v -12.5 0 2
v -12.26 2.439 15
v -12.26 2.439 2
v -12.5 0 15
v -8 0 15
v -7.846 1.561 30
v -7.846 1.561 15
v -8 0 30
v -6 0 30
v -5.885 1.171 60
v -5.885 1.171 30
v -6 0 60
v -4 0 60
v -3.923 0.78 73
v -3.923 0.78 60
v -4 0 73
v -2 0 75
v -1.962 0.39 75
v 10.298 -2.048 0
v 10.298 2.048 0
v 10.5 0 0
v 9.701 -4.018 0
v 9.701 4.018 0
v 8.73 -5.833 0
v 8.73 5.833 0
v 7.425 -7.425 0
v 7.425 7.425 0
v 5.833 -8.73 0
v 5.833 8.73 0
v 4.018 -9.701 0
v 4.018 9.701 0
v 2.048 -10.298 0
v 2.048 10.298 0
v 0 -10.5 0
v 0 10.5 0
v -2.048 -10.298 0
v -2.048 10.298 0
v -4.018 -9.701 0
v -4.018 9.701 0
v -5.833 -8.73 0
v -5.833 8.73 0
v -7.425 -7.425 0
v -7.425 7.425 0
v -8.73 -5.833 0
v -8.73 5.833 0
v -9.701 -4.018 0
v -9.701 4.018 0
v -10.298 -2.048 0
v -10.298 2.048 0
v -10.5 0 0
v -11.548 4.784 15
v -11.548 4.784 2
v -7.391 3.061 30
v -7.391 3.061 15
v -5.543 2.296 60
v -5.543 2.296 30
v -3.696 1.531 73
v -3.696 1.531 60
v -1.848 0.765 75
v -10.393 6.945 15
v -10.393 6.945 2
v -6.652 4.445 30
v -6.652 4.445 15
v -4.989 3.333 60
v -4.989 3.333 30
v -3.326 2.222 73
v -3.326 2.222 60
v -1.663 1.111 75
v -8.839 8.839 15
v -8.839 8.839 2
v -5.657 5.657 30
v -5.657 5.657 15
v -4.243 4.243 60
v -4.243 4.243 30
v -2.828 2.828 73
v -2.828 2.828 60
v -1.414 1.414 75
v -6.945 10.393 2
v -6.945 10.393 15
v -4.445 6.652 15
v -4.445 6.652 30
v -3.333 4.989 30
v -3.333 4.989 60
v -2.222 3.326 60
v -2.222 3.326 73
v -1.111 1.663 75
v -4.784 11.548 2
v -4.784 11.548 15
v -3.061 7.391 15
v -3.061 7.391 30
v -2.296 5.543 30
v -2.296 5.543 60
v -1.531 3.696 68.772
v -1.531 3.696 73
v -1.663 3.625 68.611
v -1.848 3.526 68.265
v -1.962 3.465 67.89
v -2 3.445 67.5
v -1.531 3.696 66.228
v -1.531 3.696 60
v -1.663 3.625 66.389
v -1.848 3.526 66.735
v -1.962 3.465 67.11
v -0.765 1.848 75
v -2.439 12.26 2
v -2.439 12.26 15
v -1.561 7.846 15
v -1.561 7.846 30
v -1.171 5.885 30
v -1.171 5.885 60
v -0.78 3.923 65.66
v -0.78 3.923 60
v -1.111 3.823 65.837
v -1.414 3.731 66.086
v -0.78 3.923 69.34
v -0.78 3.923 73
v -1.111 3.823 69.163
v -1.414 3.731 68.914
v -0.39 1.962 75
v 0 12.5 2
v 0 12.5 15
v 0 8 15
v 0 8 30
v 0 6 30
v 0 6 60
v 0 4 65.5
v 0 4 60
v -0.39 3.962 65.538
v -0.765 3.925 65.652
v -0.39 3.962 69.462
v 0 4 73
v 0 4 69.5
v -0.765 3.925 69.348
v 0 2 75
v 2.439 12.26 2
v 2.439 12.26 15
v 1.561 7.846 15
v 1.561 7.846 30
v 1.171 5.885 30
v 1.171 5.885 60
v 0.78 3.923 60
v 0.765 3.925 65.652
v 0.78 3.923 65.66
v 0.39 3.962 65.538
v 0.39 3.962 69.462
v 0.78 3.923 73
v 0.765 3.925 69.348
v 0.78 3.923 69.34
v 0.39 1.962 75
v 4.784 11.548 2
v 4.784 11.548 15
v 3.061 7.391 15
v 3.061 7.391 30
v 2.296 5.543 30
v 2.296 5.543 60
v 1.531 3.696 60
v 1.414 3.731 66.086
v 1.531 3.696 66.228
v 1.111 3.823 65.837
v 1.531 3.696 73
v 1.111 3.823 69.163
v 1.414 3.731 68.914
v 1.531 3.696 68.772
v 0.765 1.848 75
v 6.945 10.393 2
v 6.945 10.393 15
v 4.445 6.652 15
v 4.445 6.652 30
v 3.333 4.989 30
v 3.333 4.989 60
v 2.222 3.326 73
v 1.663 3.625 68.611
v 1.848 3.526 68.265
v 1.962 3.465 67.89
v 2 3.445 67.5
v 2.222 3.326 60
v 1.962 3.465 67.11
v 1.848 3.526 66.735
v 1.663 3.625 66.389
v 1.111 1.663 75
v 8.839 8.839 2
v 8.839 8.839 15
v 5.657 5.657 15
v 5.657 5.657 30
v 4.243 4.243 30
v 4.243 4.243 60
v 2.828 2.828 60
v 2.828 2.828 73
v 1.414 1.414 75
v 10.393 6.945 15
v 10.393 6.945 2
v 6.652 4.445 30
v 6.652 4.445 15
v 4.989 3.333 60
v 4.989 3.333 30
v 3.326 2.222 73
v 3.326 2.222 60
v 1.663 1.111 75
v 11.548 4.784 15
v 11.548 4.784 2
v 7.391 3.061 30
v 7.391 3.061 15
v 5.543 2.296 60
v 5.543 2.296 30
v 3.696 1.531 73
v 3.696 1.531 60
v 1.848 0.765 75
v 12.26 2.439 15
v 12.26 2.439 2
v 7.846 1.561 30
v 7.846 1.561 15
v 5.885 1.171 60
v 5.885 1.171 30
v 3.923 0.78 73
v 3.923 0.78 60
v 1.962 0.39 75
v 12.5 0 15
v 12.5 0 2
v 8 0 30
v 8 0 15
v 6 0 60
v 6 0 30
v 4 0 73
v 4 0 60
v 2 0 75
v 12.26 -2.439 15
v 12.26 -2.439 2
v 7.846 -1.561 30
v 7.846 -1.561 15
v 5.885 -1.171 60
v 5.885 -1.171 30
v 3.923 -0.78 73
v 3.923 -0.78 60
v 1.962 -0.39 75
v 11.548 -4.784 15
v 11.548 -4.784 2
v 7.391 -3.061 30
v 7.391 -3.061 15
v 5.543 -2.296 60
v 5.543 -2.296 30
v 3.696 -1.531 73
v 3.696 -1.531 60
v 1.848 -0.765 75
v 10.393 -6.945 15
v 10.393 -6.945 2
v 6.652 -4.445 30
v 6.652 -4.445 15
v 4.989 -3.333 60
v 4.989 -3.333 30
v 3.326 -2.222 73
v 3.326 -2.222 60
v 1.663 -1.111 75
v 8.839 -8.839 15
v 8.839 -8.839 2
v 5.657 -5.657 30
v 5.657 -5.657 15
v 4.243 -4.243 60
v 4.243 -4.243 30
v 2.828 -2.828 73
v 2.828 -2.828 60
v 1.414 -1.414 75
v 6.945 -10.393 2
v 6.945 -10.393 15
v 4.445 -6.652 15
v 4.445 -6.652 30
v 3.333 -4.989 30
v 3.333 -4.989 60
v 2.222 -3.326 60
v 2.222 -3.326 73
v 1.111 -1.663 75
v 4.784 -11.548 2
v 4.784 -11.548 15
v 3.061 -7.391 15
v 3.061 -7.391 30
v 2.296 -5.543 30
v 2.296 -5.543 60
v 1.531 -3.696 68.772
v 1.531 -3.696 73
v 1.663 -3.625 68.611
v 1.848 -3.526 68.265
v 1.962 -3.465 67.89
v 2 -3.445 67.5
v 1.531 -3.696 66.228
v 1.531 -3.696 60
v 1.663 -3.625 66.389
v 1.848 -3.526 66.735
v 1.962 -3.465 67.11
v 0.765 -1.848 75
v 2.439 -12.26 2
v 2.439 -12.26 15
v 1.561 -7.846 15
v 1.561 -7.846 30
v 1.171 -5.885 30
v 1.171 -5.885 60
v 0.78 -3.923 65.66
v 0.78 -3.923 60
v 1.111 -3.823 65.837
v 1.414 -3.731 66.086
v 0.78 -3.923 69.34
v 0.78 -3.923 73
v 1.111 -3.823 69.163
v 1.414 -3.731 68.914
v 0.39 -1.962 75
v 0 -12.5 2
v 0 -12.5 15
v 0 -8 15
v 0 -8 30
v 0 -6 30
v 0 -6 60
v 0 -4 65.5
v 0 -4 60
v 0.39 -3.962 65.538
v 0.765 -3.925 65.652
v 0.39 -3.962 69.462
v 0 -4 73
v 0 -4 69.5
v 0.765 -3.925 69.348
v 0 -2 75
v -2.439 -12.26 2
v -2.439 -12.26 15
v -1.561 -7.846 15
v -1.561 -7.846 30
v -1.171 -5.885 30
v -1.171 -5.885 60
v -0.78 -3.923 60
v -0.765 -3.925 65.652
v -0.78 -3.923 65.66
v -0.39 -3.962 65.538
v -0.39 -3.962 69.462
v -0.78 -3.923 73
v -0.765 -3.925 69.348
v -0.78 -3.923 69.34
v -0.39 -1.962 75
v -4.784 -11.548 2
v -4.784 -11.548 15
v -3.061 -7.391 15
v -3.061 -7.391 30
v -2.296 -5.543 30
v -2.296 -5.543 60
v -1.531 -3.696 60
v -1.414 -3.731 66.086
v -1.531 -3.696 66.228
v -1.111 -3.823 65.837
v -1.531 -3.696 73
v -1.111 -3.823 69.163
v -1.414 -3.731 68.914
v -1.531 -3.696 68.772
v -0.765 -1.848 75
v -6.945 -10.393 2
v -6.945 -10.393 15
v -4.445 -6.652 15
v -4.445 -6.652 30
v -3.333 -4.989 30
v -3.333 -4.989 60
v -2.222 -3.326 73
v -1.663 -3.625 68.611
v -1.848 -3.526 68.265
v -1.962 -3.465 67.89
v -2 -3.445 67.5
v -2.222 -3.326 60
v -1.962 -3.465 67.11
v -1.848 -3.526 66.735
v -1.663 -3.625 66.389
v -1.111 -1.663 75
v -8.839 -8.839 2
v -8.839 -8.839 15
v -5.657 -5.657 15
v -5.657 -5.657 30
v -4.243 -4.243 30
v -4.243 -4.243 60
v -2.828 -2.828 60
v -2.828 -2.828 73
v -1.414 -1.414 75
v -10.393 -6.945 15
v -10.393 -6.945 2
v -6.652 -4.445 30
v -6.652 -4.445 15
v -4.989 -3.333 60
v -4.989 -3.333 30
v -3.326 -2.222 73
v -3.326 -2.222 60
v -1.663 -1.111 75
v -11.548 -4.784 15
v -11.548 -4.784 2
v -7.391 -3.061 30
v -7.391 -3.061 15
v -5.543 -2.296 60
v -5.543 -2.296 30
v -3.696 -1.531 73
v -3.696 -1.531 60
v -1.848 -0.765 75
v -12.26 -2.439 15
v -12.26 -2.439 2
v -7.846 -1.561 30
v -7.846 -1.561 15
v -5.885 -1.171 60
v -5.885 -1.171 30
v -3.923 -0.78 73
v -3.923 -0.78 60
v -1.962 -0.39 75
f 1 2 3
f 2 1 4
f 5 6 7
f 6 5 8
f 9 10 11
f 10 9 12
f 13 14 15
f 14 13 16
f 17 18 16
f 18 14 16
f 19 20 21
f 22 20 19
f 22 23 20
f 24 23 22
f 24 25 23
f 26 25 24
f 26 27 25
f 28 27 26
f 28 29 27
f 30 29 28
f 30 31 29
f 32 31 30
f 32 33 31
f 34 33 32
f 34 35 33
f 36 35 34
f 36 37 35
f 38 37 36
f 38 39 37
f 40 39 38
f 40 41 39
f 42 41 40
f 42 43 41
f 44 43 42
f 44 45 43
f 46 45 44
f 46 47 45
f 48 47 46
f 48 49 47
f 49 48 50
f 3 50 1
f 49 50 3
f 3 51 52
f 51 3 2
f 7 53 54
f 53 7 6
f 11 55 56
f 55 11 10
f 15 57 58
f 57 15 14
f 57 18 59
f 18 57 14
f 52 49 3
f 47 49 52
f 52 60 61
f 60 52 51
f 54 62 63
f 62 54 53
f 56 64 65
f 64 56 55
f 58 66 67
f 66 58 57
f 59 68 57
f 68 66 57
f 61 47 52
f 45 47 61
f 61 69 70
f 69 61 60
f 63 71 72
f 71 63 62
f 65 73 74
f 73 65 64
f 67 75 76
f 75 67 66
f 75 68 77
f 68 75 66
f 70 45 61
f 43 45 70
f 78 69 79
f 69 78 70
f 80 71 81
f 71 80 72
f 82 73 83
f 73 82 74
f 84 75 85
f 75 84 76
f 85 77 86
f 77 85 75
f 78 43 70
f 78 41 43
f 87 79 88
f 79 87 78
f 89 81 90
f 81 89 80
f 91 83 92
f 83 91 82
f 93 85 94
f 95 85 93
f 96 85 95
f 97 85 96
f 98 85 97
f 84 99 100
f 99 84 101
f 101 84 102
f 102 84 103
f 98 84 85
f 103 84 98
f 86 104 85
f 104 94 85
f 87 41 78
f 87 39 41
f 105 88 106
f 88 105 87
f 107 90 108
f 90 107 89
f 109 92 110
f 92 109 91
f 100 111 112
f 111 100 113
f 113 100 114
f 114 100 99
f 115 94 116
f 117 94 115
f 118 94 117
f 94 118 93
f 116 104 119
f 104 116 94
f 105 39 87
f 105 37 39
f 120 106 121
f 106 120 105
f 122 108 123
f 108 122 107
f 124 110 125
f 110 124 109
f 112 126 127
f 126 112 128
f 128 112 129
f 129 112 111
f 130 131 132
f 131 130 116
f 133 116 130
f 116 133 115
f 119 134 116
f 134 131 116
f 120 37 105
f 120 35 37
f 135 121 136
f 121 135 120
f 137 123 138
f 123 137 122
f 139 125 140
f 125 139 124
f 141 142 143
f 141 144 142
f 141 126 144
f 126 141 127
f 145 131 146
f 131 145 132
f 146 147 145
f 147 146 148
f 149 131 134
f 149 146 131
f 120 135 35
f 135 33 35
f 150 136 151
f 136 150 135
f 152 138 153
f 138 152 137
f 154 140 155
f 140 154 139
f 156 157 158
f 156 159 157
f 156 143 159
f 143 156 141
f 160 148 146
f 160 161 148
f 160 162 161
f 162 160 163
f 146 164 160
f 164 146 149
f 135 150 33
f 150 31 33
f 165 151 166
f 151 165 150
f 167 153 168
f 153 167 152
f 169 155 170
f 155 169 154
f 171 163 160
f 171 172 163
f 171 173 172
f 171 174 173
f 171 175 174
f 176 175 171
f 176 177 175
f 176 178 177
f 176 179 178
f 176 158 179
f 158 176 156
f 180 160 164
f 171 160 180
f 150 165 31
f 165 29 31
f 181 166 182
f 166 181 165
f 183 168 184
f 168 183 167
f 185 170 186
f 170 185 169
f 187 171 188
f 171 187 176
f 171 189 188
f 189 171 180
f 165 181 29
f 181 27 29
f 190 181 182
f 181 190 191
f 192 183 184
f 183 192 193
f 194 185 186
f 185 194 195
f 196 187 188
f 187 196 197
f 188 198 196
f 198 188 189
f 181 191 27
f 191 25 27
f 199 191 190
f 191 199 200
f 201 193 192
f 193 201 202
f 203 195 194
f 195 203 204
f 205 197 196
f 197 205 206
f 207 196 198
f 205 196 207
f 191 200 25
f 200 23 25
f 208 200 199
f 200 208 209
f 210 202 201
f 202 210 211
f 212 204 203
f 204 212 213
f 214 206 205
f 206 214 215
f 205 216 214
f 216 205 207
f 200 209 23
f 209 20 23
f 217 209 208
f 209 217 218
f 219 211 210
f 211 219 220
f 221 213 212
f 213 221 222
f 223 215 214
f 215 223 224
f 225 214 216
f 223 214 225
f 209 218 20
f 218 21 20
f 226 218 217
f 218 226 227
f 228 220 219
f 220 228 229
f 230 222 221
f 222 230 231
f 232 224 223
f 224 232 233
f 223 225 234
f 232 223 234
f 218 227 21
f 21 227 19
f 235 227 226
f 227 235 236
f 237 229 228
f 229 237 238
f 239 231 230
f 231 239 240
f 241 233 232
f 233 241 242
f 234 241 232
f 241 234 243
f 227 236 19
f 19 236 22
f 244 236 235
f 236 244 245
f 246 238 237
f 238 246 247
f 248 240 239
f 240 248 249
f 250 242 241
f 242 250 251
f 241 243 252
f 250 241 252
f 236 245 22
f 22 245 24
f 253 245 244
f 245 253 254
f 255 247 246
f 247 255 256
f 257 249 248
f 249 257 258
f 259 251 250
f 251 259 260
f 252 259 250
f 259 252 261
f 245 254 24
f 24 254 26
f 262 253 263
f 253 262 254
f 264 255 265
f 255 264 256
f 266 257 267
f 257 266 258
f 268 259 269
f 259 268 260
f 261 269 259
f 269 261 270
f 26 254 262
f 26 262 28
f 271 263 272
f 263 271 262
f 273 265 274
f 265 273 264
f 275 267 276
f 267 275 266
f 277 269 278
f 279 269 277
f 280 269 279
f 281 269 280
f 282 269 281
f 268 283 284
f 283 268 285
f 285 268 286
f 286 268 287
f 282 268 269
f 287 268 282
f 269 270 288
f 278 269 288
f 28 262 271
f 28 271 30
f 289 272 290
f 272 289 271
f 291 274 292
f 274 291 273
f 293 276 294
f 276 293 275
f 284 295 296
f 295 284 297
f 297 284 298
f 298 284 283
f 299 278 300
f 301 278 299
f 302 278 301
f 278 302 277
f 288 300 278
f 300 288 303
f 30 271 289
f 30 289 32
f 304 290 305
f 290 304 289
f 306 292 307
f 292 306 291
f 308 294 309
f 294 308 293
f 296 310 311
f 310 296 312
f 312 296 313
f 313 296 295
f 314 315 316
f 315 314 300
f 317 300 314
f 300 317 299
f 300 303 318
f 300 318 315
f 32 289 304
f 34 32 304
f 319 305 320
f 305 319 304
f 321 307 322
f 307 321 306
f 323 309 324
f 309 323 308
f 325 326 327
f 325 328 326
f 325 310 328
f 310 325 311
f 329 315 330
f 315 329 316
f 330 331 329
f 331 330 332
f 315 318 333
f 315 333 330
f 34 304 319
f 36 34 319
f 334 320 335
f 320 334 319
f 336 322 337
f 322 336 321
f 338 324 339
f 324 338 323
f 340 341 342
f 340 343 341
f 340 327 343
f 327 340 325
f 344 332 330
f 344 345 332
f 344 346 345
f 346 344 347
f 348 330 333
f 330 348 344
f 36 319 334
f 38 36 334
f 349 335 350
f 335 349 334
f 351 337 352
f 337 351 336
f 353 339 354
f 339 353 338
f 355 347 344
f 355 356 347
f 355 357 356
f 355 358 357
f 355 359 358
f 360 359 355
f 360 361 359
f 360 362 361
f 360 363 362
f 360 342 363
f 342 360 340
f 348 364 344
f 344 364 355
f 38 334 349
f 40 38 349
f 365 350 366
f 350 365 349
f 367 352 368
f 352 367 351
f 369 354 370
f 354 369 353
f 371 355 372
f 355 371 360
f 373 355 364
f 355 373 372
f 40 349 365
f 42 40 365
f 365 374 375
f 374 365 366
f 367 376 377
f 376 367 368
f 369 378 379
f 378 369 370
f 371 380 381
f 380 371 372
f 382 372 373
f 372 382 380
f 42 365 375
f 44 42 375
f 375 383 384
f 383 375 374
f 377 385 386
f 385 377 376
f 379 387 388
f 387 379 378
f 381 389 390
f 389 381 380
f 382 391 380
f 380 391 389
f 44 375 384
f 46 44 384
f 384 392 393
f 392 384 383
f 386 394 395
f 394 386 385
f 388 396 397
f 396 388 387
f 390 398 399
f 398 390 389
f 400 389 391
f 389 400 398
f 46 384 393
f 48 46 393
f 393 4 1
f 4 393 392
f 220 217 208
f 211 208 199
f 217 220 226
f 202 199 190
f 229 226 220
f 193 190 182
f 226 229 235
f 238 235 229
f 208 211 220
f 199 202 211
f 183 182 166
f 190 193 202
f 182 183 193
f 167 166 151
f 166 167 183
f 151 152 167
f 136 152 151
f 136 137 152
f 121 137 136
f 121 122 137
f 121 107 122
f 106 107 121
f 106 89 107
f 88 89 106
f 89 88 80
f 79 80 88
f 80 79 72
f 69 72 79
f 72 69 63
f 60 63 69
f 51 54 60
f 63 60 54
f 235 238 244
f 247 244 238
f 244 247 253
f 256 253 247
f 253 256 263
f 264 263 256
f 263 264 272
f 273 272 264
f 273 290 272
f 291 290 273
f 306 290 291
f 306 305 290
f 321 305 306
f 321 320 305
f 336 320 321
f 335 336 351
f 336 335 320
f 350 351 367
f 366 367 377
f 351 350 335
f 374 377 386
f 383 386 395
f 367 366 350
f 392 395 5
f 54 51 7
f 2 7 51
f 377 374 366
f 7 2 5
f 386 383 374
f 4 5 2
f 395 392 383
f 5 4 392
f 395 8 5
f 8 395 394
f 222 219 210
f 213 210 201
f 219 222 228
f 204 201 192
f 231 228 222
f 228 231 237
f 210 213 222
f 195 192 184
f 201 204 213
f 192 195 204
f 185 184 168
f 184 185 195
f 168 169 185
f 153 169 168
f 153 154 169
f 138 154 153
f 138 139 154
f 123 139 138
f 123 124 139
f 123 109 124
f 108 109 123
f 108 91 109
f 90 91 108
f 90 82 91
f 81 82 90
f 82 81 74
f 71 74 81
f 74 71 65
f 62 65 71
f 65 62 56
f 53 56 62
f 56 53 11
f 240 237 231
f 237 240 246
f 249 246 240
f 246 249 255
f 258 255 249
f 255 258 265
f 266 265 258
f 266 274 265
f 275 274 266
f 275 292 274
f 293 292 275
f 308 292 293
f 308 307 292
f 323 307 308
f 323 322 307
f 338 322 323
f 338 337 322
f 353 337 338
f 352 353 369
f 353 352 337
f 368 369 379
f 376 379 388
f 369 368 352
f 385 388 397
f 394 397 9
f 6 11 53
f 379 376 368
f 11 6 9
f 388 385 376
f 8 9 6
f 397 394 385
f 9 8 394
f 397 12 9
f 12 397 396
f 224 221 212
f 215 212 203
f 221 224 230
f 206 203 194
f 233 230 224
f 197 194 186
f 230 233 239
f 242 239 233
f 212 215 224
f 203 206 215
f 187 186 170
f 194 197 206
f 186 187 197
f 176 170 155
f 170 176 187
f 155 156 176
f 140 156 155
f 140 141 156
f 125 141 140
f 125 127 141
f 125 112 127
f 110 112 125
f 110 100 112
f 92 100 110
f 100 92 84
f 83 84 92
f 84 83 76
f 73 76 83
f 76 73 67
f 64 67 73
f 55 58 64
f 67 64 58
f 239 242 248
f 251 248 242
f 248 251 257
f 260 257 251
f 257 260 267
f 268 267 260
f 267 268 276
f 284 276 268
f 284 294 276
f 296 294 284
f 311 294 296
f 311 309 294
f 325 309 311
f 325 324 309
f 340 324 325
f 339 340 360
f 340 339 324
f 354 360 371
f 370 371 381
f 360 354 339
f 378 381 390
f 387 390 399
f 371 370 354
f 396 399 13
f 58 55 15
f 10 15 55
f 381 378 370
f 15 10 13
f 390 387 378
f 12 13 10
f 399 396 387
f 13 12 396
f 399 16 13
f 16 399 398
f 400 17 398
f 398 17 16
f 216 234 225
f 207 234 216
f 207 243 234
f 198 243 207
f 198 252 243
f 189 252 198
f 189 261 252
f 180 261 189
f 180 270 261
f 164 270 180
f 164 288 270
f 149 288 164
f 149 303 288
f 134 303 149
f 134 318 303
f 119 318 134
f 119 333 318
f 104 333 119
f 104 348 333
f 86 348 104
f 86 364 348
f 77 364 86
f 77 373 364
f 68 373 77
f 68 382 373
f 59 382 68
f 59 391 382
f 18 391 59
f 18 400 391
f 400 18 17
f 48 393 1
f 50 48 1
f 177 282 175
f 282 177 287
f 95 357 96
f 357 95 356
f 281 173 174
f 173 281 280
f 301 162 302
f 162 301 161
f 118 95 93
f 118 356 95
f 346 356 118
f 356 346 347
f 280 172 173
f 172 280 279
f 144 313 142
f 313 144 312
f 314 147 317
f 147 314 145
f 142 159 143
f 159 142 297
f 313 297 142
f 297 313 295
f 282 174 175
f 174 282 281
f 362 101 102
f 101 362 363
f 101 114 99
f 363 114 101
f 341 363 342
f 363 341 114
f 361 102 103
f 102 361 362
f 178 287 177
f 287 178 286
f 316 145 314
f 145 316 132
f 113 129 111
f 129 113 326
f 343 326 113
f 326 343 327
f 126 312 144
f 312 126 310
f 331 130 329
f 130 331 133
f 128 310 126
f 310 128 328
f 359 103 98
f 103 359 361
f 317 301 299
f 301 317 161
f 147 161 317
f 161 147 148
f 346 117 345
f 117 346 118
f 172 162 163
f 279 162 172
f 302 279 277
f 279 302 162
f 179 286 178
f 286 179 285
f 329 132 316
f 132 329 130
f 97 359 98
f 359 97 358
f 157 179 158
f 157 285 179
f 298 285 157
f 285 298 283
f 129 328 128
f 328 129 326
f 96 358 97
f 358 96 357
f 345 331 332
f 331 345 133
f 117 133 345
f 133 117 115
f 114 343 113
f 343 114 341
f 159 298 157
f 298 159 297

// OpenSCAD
$fn = 32;

// ----------------------------------------------------------------------
// Stepped shaft: diameters 25, 16, 12, 8 mm, 75 mm long
// ----------------------------------------------------------------------

// --- parameters (mm) ---
d1 = 25;                  // step 1 diameter
len1 = 15;                // step 1 length
d2 = 16;                  // step 2 diameter
len2 = 15;                // step 2 length
d3 = 12;                  // step 3 diameter
len3 = 30;                // step 3 length
d4 = 8;                   // step 4 diameter
len4 = 15;                // step 4 length
total = 75;               // overall length
chamfer = 2;              // end chamfer
cross_d = 4;              // cross pin hole
cross_z = 67.5;           // cross hole position

/* closed turning profile: x is the radius, y is the length */
profile = [[0, 0], [12.5 - chamfer, 0], [12.5, chamfer], [12.5, 15], [8, 15], [8, 30], [6, 30], [6, 60], [4, 60], [4, 73], [2, 75], [0, 75]];

difference() {
  rotate_extrude() polygon(profile);
  /* cross pin hole through the small step */
  translate([0, 0, cross_z]) rotate([90, 0, 0]) cylinder(h = d4 + 4, d = cross_d, center = true);
}
